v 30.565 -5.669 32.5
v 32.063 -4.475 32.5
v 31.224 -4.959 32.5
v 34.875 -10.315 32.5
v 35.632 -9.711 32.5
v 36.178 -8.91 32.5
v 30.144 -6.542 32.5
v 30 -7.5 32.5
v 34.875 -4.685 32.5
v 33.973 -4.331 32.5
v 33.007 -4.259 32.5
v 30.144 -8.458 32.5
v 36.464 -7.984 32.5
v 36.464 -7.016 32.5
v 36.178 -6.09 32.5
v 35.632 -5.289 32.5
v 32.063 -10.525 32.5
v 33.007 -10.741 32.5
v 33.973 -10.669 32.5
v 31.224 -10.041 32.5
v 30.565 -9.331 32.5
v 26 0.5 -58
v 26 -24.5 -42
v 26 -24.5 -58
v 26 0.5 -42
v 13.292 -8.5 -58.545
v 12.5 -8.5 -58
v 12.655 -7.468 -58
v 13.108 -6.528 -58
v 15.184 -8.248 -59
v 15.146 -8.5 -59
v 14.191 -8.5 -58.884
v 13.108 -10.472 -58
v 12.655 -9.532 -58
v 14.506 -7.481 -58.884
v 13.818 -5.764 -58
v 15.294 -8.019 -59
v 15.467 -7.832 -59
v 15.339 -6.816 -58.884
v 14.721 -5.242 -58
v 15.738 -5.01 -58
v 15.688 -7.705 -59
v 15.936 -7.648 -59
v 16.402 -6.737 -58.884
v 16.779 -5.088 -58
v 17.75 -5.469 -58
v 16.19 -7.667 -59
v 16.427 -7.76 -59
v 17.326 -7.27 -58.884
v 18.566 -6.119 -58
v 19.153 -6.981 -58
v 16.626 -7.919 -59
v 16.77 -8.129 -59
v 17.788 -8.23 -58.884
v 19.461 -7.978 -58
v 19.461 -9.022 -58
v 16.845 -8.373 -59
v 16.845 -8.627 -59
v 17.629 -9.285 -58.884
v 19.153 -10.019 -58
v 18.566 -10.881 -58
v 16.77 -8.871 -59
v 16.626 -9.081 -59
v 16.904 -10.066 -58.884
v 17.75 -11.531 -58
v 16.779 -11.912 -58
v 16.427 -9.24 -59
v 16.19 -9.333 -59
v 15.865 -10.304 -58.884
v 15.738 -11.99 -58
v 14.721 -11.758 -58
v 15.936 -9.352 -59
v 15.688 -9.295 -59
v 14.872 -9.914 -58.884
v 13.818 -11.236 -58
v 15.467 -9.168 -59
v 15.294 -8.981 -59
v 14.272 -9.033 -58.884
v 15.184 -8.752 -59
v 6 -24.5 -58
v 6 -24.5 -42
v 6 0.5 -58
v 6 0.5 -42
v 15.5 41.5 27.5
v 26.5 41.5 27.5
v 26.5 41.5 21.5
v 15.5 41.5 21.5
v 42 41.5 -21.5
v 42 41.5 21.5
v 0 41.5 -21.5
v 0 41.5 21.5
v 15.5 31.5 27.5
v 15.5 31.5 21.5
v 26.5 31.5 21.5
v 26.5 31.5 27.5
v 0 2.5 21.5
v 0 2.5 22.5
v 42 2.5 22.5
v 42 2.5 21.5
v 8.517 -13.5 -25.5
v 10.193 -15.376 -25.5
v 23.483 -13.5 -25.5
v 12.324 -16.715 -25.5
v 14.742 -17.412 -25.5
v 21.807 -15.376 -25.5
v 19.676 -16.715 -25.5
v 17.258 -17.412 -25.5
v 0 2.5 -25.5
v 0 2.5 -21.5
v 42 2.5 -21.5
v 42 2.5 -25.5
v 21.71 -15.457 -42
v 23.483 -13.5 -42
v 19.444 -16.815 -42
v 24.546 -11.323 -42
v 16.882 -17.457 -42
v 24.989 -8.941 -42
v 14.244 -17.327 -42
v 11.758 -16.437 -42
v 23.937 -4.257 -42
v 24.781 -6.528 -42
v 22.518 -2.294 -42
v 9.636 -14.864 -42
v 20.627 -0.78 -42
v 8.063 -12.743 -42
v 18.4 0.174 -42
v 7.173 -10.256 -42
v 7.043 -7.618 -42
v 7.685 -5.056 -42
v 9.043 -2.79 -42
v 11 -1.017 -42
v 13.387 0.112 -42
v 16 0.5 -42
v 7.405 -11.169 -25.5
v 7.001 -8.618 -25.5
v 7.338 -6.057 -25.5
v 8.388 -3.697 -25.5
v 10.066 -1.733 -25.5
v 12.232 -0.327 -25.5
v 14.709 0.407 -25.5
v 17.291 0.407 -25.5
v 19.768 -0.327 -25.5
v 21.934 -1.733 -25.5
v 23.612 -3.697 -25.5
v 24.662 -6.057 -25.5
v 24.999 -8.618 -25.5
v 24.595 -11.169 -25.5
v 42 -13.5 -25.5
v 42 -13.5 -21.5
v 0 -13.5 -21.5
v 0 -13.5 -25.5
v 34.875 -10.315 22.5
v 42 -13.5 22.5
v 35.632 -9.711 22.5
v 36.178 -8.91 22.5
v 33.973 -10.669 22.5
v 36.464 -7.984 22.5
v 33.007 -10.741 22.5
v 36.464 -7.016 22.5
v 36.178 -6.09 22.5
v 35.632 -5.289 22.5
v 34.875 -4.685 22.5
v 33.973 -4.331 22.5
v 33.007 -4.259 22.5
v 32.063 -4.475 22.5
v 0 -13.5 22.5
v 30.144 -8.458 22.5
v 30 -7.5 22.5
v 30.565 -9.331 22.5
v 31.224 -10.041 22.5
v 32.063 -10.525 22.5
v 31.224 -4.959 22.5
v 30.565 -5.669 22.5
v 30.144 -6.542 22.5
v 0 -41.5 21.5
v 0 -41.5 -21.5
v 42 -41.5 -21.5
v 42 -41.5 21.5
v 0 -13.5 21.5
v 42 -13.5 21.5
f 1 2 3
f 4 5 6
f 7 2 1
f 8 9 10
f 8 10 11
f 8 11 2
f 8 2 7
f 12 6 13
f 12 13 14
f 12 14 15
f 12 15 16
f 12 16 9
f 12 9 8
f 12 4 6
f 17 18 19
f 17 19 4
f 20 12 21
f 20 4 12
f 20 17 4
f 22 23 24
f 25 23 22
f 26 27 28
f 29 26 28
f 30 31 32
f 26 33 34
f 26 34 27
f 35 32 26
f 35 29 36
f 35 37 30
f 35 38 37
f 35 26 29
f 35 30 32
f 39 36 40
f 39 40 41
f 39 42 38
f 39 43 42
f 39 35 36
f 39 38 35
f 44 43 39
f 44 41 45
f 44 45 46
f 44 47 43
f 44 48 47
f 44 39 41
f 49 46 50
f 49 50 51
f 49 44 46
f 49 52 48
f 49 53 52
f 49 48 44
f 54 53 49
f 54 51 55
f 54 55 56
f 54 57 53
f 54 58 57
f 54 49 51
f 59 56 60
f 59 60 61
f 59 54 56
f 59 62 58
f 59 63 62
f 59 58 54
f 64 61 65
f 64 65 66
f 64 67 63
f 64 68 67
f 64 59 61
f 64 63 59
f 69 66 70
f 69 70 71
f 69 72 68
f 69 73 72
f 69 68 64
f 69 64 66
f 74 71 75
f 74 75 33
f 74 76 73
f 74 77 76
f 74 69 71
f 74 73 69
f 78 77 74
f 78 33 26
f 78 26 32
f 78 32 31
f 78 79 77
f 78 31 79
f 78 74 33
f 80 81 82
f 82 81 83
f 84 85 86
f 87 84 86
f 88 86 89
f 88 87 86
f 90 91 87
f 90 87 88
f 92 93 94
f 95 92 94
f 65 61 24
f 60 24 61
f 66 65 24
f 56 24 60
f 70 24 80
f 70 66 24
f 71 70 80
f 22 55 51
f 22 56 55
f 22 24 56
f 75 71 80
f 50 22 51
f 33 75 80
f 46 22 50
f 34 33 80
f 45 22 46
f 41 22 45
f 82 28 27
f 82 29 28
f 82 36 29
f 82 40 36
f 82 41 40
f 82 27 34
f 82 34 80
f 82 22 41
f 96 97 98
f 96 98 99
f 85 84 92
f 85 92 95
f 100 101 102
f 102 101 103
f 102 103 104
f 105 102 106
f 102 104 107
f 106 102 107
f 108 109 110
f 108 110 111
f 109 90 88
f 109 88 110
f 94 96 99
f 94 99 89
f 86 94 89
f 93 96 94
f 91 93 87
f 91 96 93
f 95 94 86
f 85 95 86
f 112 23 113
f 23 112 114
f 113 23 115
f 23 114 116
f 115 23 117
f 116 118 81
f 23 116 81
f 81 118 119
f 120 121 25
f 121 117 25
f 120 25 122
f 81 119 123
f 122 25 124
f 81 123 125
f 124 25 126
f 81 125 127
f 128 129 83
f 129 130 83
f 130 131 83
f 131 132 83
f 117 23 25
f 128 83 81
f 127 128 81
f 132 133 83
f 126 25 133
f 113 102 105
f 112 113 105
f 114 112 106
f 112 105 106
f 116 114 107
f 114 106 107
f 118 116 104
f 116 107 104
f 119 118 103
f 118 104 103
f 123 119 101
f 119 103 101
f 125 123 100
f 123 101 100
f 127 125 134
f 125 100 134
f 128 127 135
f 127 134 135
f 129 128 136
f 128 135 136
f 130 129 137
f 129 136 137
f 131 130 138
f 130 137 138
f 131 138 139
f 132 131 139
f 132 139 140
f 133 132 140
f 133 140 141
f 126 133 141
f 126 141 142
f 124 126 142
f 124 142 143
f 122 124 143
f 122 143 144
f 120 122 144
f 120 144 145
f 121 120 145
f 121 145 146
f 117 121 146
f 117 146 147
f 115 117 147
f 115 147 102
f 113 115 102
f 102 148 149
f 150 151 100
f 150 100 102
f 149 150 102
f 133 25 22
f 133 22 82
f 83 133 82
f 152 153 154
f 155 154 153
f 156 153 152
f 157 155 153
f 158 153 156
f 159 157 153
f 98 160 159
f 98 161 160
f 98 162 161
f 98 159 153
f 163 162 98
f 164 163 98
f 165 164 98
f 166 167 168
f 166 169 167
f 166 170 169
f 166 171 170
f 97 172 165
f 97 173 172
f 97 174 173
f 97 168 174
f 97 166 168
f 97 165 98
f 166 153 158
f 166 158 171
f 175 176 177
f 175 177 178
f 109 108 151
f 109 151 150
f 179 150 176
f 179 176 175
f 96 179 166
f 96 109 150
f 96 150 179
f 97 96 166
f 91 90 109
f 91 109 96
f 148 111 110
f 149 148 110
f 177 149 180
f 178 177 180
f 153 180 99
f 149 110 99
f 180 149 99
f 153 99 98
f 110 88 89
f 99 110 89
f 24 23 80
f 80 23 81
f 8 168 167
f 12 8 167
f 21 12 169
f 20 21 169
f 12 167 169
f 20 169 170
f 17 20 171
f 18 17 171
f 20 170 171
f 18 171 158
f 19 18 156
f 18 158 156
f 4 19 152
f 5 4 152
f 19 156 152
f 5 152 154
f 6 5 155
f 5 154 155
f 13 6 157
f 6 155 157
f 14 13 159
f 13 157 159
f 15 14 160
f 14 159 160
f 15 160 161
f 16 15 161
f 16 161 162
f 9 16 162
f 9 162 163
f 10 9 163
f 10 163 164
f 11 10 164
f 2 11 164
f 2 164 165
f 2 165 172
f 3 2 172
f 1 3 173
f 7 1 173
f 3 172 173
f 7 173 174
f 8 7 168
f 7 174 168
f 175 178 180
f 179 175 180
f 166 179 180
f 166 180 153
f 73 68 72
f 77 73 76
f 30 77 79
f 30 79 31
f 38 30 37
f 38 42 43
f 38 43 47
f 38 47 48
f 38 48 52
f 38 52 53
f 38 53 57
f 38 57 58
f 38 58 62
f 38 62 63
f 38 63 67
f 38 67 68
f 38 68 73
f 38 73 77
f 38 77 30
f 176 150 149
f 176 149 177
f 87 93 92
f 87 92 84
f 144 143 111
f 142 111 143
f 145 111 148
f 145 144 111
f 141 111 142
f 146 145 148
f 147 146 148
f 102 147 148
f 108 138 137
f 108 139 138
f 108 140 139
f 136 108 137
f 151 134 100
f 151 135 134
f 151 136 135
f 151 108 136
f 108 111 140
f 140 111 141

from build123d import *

# Parameters (mm, degrees)
SALIENTE_EXTRUIR1_DEPTH = 42
CROQUIS2_W              = 11
CROQUIS2_H              = 10
SALIENTE_EXTRUIR2_DEPTH = 6
CROQUIS3_R              = 3.25
SALIENTE_EXTRUIR3_DEPTH = 10
CROQUIS4_R              = 9
SALIENTE_EXTRUIR4_DEPTH = 16.5
CROQUIS5_W              = 20
CROQUIS5_H              = 25
SALIENTE_EXTRUIR5_DEPTH = 16
CROQUIS6_R              = 3.5
SALIENTE_EXTRUIR6_DEPTH = 1
REDONDEO2_R             = 4


with BuildPart() as part:
    # Croquis1 → Saliente-Extruir1 (new body)
    with BuildSketch(Plane(origin=(0, 0, 0), x_dir=(0, 0, -1), z_dir=(1, 0, 0))):
        Polygon((21.5, 2.5), (25.5, 2.5), (25.5, -13.5), (21.5, -13.5), (21.5, -41.5), (-21.5, -41.5), (-21.5, -13.5), (-22.5, -13.5), (-22.5, 2.5), (-21.5, 2.5), (-21.5, 41.5), (21.5, 41.5), align=None)
    extrude(amount=SALIENTE_EXTRUIR1_DEPTH)

    # Croquis2 → Saliente-Extruir2 (add)
    with BuildSketch(Plane.XY.offset(21.5)):
        with Locations((21, 36.5)):
            Rectangle(CROQUIS2_W, CROQUIS2_H)
    extrude(amount=SALIENTE_EXTRUIR2_DEPTH)

    # Croquis3 → Saliente-Extruir3 (add)
    with BuildSketch(Plane.XY.offset(22.5)):
        with Locations(Location((33.25, -7.5, 0), (0, 0, 180))):
            Circle(CROQUIS3_R)
    extrude(amount=SALIENTE_EXTRUIR3_DEPTH)

    # Croquis4 → Saliente-Extruir4 (add)
    with BuildSketch(Plane(origin=(0, 0, -25.5), x_dir=(-1, 0, 0), z_dir=(0, 0, -1))):
        with Locations(Location((-16, -8.5, 0), (0, 0, 213.748988596))):
            Circle(CROQUIS4_R)
    extrude(amount=SALIENTE_EXTRUIR4_DEPTH)

    # Croquis5 → Saliente-Extruir5 (add)
    with BuildSketch(Plane(origin=(0, 0, -42), x_dir=(-1, 0, 0), z_dir=(0, 0, -1))):
        with Locations((-16, -12)):
            Rectangle(CROQUIS5_W, CROQUIS5_H)
    extrude(amount=SALIENTE_EXTRUIR5_DEPTH)

    # Croquis6 → Saliente-Extruir6 (add)
    with BuildSketch(Plane(origin=(0, 0, -58), x_dir=(-1, 0, 0), z_dir=(0, 0, -1))):
        with Locations((-16, -8.5)):
            Circle(CROQUIS6_R)
    extrude(amount=SALIENTE_EXTRUIR6_DEPTH)

    # Redondeo2
    # the kernel refuses this fillet: 4 mm, written as the material it takes off along each edge
    with BuildSketch(Plane(origin=(16, -8.5, -59), x_dir=(-1, 0, 0), z_dir=(0, -1, 0))) as redondeo2_piece_1:
        with BuildLine():
            CenterArc((0.854248689, -4), REDONDEO2_R, 48.590377891, 41.409622109)
            Line((0.854248689, 0), (0.854248689, 0.08))
            Line((0.854248689, 0.08), (3.5, 0.08))
            Line((3.5, 0.08), (3.58, 0))
            ThreePointArc((3.58, 0), (3.58, -0.5), (3.552915026, -0.94))
            Line((3.552915026, -0.94), (3.5, -1))
        make_face()
    revolve(axis=Axis((16, -8.5, -59), (0, 0, -1)), mode=Mode.SUBTRACT)


solid = part.part
